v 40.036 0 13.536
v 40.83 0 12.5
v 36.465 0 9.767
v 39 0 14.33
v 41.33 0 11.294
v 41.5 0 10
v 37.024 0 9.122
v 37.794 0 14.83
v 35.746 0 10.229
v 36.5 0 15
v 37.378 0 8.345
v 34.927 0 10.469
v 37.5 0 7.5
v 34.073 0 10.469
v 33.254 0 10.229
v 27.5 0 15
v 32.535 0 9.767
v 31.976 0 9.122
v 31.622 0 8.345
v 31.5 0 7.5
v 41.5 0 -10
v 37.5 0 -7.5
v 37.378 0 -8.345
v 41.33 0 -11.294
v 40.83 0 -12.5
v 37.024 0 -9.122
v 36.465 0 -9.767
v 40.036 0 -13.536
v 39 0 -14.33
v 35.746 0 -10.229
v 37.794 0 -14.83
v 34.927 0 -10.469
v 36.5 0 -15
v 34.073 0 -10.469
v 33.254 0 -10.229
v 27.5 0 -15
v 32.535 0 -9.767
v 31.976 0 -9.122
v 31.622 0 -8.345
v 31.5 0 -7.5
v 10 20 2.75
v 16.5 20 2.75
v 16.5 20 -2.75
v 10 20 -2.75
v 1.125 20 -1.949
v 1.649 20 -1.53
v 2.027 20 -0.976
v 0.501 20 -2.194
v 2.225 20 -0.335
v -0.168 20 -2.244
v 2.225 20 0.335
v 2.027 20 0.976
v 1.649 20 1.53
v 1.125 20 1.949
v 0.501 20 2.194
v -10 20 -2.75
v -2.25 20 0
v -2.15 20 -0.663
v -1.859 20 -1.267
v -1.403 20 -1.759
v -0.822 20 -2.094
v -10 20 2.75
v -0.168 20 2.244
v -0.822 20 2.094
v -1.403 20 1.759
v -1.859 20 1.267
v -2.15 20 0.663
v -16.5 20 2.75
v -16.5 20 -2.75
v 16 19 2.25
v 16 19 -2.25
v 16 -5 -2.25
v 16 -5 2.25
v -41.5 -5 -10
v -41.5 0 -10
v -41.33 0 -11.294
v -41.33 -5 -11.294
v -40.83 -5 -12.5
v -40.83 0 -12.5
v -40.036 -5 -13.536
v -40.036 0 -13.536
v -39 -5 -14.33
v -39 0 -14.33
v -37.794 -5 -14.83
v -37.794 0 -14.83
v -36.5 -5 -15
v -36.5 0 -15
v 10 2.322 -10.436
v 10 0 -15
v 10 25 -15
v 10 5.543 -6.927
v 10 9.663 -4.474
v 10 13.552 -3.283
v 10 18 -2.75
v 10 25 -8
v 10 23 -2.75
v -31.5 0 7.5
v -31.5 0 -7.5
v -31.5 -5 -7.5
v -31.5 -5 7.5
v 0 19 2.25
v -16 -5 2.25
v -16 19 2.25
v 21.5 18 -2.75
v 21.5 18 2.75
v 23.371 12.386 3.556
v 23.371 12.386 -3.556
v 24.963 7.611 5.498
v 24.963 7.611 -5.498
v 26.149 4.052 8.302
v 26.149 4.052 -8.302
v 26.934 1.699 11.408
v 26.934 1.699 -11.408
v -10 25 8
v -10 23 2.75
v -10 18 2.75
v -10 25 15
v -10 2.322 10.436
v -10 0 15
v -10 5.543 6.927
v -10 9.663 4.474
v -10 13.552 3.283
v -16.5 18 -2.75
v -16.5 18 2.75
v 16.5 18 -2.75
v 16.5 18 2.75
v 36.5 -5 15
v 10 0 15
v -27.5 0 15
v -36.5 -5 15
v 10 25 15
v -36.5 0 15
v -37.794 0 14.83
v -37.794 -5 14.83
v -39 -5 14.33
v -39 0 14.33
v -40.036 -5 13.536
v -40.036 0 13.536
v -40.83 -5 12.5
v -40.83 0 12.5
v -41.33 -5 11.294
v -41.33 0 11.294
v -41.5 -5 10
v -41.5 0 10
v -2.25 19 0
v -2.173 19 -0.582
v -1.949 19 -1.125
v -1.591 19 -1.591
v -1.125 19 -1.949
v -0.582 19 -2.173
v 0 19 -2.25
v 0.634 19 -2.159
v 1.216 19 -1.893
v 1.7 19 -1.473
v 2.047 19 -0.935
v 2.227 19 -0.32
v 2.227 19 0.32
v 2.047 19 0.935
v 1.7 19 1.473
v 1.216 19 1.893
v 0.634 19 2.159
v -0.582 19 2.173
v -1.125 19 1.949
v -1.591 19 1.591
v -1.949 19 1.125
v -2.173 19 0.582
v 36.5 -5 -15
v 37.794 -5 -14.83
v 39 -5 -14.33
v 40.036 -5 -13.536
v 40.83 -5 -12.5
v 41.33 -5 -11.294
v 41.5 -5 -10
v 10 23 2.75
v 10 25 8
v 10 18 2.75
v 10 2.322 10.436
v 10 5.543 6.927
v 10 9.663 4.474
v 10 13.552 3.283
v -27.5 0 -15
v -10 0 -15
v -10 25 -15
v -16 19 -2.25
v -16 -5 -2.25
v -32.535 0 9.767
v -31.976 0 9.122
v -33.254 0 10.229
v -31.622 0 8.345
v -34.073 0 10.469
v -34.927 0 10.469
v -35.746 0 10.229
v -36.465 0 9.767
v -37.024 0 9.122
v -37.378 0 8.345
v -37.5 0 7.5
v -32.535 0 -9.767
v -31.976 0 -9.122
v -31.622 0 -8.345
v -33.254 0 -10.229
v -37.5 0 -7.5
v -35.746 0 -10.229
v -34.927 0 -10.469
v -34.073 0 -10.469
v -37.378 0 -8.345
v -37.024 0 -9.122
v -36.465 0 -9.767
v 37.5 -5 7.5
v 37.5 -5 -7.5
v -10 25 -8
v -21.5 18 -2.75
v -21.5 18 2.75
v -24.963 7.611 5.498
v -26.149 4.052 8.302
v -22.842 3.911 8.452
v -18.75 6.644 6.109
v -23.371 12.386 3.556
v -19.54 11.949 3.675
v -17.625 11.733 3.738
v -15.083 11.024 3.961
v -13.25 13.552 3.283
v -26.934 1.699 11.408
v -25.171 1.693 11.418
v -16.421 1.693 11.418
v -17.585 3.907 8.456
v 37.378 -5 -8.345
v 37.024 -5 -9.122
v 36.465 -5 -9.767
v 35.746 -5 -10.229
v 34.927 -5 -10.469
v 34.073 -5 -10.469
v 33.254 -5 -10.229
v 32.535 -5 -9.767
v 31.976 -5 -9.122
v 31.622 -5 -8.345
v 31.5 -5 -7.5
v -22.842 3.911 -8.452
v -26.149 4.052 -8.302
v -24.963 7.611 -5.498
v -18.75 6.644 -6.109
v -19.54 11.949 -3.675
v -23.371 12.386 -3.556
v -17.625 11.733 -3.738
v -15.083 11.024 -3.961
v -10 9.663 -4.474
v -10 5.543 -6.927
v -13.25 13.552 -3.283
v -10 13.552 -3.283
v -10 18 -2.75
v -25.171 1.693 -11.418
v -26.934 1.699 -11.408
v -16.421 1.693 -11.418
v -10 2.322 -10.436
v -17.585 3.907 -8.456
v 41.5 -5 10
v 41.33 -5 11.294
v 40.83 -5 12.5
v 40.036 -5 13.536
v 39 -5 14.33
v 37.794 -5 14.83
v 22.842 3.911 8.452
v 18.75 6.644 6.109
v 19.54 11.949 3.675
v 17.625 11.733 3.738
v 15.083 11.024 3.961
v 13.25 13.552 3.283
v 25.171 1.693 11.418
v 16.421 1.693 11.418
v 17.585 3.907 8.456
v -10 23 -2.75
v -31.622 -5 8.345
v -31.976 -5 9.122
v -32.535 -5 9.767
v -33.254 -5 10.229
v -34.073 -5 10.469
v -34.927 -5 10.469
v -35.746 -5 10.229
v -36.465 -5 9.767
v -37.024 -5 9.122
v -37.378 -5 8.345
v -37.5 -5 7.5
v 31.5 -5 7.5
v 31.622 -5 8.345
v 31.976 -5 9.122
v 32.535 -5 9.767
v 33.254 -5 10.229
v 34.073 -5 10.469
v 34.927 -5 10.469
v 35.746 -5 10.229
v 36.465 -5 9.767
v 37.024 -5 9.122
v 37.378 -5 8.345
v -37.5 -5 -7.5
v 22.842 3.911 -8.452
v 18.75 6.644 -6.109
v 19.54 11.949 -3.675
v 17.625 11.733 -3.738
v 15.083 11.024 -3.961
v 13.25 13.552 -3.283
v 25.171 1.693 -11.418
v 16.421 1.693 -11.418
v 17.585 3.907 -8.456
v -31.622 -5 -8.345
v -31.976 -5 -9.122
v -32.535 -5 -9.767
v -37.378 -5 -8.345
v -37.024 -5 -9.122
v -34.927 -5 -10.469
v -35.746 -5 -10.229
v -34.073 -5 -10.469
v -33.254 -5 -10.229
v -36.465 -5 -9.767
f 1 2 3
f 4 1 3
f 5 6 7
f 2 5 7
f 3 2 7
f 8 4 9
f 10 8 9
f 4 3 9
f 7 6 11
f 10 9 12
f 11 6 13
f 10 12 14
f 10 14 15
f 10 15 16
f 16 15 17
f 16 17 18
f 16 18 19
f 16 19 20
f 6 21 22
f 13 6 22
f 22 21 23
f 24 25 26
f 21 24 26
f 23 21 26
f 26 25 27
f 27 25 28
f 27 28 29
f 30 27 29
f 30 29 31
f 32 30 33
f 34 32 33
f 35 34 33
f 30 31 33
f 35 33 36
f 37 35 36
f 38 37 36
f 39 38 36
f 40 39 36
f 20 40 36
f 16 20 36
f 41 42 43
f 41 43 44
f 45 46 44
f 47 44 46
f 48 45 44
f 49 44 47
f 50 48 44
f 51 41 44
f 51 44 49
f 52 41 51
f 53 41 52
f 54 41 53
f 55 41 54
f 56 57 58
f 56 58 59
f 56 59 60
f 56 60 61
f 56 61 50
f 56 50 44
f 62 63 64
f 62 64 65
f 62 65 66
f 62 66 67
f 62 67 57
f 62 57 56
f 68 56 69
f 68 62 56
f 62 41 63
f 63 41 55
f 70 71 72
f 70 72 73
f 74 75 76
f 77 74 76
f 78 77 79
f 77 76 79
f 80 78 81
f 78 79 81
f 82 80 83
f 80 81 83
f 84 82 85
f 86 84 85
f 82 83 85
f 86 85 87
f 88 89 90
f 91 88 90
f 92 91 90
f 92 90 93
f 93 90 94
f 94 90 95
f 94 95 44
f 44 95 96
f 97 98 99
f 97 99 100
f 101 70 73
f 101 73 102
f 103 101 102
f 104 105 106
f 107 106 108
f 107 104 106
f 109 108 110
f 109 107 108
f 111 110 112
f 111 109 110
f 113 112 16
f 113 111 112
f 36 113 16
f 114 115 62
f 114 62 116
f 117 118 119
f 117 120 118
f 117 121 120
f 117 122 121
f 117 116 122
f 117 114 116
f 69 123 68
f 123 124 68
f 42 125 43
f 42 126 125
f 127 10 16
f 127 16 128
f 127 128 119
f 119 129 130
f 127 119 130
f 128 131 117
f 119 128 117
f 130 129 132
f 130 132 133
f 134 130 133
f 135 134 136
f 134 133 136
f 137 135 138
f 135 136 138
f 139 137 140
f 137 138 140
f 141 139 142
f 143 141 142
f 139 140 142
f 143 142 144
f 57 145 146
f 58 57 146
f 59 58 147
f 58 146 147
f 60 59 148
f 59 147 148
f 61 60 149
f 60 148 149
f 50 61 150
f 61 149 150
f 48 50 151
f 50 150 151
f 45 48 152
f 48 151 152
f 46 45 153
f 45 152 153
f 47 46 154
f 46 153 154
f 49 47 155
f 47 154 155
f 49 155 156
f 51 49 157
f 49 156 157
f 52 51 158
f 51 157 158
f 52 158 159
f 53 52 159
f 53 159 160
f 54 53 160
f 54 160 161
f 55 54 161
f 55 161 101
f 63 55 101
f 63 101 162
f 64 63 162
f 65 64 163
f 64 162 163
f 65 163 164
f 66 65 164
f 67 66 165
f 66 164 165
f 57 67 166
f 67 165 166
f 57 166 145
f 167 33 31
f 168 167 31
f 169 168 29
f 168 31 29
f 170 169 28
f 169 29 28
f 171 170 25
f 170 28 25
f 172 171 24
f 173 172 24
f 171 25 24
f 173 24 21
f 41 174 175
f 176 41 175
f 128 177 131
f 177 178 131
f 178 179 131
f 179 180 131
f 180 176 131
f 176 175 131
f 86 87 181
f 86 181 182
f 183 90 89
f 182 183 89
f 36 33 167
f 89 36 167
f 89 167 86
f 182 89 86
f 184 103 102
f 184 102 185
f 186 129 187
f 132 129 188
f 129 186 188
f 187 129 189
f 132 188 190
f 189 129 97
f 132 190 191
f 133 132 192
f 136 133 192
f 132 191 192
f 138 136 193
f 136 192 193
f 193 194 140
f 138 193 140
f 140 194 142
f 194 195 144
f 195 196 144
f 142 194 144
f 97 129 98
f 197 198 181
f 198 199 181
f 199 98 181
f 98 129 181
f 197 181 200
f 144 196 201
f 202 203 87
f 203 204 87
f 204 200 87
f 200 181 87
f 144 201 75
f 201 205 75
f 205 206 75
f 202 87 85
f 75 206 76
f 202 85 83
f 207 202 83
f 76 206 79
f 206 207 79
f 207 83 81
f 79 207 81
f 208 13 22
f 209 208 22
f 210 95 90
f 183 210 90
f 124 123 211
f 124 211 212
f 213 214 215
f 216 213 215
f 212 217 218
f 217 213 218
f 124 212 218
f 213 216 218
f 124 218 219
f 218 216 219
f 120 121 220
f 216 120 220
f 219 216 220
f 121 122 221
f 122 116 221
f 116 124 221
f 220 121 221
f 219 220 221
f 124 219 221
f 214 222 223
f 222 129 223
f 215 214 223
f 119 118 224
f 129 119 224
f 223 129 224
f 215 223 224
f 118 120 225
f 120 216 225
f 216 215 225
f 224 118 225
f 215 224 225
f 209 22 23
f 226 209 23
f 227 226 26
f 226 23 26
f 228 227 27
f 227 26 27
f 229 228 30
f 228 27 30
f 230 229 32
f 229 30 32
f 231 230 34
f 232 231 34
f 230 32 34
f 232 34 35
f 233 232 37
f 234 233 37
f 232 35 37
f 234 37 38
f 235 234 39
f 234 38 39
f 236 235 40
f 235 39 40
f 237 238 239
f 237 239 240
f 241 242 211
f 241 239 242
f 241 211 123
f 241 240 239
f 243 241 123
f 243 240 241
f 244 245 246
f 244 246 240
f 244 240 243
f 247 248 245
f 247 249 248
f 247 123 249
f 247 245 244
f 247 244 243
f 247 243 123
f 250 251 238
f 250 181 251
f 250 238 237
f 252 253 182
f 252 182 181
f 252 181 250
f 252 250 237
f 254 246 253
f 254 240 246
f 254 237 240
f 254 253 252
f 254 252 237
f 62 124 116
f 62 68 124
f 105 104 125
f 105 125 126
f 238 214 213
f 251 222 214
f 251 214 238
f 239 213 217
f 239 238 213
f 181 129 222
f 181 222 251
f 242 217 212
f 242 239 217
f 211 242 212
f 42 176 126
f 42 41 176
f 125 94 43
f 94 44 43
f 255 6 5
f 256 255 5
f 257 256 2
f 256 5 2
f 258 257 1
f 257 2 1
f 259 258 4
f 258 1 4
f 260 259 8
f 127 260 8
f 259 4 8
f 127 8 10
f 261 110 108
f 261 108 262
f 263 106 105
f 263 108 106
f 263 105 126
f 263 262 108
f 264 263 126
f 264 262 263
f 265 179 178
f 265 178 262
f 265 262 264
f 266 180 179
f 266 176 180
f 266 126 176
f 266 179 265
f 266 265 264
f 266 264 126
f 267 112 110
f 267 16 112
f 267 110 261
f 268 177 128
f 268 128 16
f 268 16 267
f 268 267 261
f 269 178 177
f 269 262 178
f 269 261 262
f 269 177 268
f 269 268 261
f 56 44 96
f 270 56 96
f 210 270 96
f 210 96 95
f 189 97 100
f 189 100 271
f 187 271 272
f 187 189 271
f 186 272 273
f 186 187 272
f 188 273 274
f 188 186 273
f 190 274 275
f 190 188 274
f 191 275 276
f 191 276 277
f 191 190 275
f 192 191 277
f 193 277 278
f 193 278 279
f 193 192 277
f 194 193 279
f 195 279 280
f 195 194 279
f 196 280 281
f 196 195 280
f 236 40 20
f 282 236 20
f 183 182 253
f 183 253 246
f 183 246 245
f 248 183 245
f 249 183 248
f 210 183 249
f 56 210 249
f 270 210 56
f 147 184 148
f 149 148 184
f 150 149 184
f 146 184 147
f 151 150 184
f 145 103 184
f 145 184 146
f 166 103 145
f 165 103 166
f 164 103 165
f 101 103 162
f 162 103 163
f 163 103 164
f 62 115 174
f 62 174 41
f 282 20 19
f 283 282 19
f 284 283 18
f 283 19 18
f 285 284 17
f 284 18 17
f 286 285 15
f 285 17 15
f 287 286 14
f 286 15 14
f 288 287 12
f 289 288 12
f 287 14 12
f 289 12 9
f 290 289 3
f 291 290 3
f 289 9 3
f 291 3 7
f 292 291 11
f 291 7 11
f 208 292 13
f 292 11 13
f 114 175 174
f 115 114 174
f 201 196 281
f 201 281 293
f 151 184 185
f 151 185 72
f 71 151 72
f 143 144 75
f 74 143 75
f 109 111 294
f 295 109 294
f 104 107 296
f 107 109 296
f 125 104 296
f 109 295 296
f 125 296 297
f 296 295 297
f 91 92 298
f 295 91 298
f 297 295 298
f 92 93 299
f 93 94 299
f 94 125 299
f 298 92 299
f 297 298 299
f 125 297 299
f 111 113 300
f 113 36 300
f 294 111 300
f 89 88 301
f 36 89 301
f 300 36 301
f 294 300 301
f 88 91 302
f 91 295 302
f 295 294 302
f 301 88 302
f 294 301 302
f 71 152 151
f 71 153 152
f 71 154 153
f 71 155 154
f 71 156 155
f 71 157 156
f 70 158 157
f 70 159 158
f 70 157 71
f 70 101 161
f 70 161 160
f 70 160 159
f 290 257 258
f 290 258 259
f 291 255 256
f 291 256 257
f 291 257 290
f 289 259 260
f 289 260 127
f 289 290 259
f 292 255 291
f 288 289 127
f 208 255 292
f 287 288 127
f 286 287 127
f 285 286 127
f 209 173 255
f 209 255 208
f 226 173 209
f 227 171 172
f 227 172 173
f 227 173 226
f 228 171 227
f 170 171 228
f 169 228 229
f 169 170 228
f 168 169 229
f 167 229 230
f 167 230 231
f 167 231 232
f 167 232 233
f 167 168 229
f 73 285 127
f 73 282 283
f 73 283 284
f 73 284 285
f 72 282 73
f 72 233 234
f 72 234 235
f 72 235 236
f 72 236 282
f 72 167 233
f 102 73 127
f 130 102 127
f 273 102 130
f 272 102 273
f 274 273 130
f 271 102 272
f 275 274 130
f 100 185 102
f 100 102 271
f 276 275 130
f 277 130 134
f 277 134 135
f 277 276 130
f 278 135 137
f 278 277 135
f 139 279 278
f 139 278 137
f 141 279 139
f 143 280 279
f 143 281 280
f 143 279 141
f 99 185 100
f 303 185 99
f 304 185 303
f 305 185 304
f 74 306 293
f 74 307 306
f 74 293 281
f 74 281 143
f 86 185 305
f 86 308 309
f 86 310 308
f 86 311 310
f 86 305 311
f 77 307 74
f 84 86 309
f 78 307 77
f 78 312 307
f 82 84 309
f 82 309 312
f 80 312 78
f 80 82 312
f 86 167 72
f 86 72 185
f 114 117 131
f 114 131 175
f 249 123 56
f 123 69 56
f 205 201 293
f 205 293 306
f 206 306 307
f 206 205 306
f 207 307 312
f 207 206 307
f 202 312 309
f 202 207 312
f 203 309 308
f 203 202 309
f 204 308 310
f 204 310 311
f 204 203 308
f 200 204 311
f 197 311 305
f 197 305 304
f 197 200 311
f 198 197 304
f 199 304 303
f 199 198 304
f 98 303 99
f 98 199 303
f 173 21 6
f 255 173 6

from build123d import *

# Parameters (mm, degrees)
BOSS_EXTRUDE1_DEPTH     = 5
BOSS_EXTRUDE2_DEPTH     = 27.5
BOSS_EXTRUDE3_DEPTH     = 10
CUT_EXTRUDE2_DEPTH      = 51.717354111
CUT_EXTRUDE2_DEPTH_BACK = 51.717354111
SKETCH5_3_W             = 6.5
SKETCH5_3_H             = 2
SKETCH5_3_W_2           = 20
BOSS_EXTRUDE4_DEPTH     = 2.75
CUT_EXTRUDE3_DEPTH      = 54.359629019
CUT_EXTRUDE3_DEPTH_BACK = 24
M4_CLEARANCE_HOLE1_D    = 4.5


with BuildPart() as part:
    # Sketch1 → Boss-Extrude1 (new body)
    with BuildSketch(Plane(origin=(0, 0, 0), x_dir=(1, 0, 0), z_dir=(0, 1, 0))):
        with BuildLine():
            Line((-36.5, 15), (36.5, 15))
            ThreePointArc((36.5, 15), (40.035533906, 13.535533906), (41.5, 10))
            Line((41.5, 10), (41.5, -10))
            ThreePointArc((41.5, -10), (40.035533906, -13.535533906), (36.5, -15))
            Line((36.5, -15), (-36.5, -15))
            ThreePointArc((-36.5, -15), (-40.035533906, -13.535533906), (-41.5, -10))
            Line((-41.5, -10), (-41.5, 10))
            ThreePointArc((-41.5, 10), (-40.035533906, 13.535533906), (-36.5, 15))
        make_face()
        with BuildLine():
            Line((-31.5, 7.5), (-31.5, -7.5))
            ThreePointArc((-31.5, -7.5), (-34.5, -10.5), (-37.5, -7.5))
            Line((-37.5, -7.5), (-37.5, 7.5))
            ThreePointArc((-37.5, 7.5), (-34.5, 10.5), (-31.5, 7.5))
        make_face(mode=Mode.SUBTRACT)
        with BuildLine():
            Line((31.5, 7.5), (31.5, -7.5))
            ThreePointArc((31.5, -7.5), (34.5, -10.5), (37.5, -7.5))
            Line((37.5, -7.5), (37.5, 7.5))
            ThreePointArc((37.5, 7.5), (34.5, 10.5), (31.5, 7.5))
        make_face(mode=Mode.SUBTRACT)
    extrude(amount=-BOSS_EXTRUDE1_DEPTH)

    # Sketch2 → Boss-Extrude2 (add, symmetric)
    with BuildSketch(Plane(origin=(0, 0, 0), x_dir=(0, 0, -1), z_dir=(1, 0, 0))):
        with BuildLine():
            Line((-15, 0), (0, 0))
            Line((0, 0), (0, 18))
            Line((0, 18), (-2.75, 18))
            add(Edge.make_bspline(
                [(-15, 0), (-3.342305564, 4.287493928), (-2.75, 18)],
                knots=[0, 0, 0, 1, 1, 1], degree=2))
        make_face()
        with BuildLine():
            Line((0, 18), (0, 0))
            Line((0, 0), (15, 0))
            add(Edge.make_bspline(
                [(15, 0), (3.342305564, 4.287493928), (2.75, 18)],
                knots=[0, 0, 0, 1, 1, 1], degree=2))
            Line((2.75, 18), (0, 18))
        make_face()
    extrude(amount=BOSS_EXTRUDE2_DEPTH, both=True)

    # Sketch2<3> → Boss-Extrude3 (add, symmetric)
    with BuildSketch(Plane(origin=(0, 0, 0), x_dir=(0, 0, -1), z_dir=(1, 0, 0))):
        with BuildLine():
            Line((-15, 0), (-15, 25))
            Line((-15, 25), (-8, 25))
            Line((-8, 25), (-2.75, 23))
            Line((-2.75, 23), (-2.75, 18))
            add(Edge.make_bspline(
                [(-15, 0), (-3.342305564, 4.287493928), (-2.75, 18)],
                knots=[0, 0, 0, 1, 1, 1], degree=2))
        make_face()
        with BuildLine():
            add(Edge.make_bspline(
                [(15, 0), (3.342305564, 4.287493928), (2.75, 18)],
                knots=[0, 0, 0, 1, 1, 1], degree=2))
            Line((2.75, 18), (2.75, 23))
            Line((2.75, 23), (8, 25))
            Line((8, 25), (15, 25))
            Line((15, 25), (15, 0))
        make_face()
    extrude(amount=BOSS_EXTRUDE3_DEPTH, both=True)

    # Sketch5 → Cut-Extrude2 (cut, two sides: drawn at the far end of the back side and taken through both)
    with BuildSketch(Plane.XY.offset(-CUT_EXTRUDE2_DEPTH_BACK)):
        Polygon((-27.5, 18), (-27.5, 0), (-21.5, 18), align=None)
        Polygon((21.5, 18), (27.5, 0), (27.5, 18), align=None)
    extrude(amount=CUT_EXTRUDE2_DEPTH + CUT_EXTRUDE2_DEPTH_BACK, mode=Mode.SUBTRACT)

    # Sketch5<3> → Boss-Extrude4 (add, symmetric)
    with BuildSketch(Plane.XY):
        with Locations((13.25, 19)):
            Rectangle(SKETCH5_3_W, SKETCH5_3_H)
        with Locations((-13.25, 19)):
            Rectangle(SKETCH5_3_W, SKETCH5_3_H)
        with Locations((0, 19)):
            Rectangle(SKETCH5_3_W_2, SKETCH5_3_H)
    extrude(amount=BOSS_EXTRUDE4_DEPTH, both=True)

    # Sketch6 → Cut-Extrude3 (cut, two sides: drawn at the far end of the back side and taken through both)
    with BuildSketch(Plane.XZ.offset(5).offset(-CUT_EXTRUDE3_DEPTH_BACK)):
        Polygon((16, 2.25), (10, 2.25), (-10, 2.25), (-16, 2.25), (-16, -2.25), (-10, -2.25), (10, -2.25), (16, -2.25), align=None)
    extrude(amount=CUT_EXTRUDE3_DEPTH + CUT_EXTRUDE3_DEPTH_BACK, mode=Mode.SUBTRACT)

    # M4 Clearance Hole1 (through all)
    with Locations(Plane(origin=(0, 20, 0), x_dir=(1, 0, 0), z_dir=(0, 1, 0))):
        with Locations((0, 0)):
            Hole(M4_CLEARANCE_HOLE1_D / 2)


solid = part.part
